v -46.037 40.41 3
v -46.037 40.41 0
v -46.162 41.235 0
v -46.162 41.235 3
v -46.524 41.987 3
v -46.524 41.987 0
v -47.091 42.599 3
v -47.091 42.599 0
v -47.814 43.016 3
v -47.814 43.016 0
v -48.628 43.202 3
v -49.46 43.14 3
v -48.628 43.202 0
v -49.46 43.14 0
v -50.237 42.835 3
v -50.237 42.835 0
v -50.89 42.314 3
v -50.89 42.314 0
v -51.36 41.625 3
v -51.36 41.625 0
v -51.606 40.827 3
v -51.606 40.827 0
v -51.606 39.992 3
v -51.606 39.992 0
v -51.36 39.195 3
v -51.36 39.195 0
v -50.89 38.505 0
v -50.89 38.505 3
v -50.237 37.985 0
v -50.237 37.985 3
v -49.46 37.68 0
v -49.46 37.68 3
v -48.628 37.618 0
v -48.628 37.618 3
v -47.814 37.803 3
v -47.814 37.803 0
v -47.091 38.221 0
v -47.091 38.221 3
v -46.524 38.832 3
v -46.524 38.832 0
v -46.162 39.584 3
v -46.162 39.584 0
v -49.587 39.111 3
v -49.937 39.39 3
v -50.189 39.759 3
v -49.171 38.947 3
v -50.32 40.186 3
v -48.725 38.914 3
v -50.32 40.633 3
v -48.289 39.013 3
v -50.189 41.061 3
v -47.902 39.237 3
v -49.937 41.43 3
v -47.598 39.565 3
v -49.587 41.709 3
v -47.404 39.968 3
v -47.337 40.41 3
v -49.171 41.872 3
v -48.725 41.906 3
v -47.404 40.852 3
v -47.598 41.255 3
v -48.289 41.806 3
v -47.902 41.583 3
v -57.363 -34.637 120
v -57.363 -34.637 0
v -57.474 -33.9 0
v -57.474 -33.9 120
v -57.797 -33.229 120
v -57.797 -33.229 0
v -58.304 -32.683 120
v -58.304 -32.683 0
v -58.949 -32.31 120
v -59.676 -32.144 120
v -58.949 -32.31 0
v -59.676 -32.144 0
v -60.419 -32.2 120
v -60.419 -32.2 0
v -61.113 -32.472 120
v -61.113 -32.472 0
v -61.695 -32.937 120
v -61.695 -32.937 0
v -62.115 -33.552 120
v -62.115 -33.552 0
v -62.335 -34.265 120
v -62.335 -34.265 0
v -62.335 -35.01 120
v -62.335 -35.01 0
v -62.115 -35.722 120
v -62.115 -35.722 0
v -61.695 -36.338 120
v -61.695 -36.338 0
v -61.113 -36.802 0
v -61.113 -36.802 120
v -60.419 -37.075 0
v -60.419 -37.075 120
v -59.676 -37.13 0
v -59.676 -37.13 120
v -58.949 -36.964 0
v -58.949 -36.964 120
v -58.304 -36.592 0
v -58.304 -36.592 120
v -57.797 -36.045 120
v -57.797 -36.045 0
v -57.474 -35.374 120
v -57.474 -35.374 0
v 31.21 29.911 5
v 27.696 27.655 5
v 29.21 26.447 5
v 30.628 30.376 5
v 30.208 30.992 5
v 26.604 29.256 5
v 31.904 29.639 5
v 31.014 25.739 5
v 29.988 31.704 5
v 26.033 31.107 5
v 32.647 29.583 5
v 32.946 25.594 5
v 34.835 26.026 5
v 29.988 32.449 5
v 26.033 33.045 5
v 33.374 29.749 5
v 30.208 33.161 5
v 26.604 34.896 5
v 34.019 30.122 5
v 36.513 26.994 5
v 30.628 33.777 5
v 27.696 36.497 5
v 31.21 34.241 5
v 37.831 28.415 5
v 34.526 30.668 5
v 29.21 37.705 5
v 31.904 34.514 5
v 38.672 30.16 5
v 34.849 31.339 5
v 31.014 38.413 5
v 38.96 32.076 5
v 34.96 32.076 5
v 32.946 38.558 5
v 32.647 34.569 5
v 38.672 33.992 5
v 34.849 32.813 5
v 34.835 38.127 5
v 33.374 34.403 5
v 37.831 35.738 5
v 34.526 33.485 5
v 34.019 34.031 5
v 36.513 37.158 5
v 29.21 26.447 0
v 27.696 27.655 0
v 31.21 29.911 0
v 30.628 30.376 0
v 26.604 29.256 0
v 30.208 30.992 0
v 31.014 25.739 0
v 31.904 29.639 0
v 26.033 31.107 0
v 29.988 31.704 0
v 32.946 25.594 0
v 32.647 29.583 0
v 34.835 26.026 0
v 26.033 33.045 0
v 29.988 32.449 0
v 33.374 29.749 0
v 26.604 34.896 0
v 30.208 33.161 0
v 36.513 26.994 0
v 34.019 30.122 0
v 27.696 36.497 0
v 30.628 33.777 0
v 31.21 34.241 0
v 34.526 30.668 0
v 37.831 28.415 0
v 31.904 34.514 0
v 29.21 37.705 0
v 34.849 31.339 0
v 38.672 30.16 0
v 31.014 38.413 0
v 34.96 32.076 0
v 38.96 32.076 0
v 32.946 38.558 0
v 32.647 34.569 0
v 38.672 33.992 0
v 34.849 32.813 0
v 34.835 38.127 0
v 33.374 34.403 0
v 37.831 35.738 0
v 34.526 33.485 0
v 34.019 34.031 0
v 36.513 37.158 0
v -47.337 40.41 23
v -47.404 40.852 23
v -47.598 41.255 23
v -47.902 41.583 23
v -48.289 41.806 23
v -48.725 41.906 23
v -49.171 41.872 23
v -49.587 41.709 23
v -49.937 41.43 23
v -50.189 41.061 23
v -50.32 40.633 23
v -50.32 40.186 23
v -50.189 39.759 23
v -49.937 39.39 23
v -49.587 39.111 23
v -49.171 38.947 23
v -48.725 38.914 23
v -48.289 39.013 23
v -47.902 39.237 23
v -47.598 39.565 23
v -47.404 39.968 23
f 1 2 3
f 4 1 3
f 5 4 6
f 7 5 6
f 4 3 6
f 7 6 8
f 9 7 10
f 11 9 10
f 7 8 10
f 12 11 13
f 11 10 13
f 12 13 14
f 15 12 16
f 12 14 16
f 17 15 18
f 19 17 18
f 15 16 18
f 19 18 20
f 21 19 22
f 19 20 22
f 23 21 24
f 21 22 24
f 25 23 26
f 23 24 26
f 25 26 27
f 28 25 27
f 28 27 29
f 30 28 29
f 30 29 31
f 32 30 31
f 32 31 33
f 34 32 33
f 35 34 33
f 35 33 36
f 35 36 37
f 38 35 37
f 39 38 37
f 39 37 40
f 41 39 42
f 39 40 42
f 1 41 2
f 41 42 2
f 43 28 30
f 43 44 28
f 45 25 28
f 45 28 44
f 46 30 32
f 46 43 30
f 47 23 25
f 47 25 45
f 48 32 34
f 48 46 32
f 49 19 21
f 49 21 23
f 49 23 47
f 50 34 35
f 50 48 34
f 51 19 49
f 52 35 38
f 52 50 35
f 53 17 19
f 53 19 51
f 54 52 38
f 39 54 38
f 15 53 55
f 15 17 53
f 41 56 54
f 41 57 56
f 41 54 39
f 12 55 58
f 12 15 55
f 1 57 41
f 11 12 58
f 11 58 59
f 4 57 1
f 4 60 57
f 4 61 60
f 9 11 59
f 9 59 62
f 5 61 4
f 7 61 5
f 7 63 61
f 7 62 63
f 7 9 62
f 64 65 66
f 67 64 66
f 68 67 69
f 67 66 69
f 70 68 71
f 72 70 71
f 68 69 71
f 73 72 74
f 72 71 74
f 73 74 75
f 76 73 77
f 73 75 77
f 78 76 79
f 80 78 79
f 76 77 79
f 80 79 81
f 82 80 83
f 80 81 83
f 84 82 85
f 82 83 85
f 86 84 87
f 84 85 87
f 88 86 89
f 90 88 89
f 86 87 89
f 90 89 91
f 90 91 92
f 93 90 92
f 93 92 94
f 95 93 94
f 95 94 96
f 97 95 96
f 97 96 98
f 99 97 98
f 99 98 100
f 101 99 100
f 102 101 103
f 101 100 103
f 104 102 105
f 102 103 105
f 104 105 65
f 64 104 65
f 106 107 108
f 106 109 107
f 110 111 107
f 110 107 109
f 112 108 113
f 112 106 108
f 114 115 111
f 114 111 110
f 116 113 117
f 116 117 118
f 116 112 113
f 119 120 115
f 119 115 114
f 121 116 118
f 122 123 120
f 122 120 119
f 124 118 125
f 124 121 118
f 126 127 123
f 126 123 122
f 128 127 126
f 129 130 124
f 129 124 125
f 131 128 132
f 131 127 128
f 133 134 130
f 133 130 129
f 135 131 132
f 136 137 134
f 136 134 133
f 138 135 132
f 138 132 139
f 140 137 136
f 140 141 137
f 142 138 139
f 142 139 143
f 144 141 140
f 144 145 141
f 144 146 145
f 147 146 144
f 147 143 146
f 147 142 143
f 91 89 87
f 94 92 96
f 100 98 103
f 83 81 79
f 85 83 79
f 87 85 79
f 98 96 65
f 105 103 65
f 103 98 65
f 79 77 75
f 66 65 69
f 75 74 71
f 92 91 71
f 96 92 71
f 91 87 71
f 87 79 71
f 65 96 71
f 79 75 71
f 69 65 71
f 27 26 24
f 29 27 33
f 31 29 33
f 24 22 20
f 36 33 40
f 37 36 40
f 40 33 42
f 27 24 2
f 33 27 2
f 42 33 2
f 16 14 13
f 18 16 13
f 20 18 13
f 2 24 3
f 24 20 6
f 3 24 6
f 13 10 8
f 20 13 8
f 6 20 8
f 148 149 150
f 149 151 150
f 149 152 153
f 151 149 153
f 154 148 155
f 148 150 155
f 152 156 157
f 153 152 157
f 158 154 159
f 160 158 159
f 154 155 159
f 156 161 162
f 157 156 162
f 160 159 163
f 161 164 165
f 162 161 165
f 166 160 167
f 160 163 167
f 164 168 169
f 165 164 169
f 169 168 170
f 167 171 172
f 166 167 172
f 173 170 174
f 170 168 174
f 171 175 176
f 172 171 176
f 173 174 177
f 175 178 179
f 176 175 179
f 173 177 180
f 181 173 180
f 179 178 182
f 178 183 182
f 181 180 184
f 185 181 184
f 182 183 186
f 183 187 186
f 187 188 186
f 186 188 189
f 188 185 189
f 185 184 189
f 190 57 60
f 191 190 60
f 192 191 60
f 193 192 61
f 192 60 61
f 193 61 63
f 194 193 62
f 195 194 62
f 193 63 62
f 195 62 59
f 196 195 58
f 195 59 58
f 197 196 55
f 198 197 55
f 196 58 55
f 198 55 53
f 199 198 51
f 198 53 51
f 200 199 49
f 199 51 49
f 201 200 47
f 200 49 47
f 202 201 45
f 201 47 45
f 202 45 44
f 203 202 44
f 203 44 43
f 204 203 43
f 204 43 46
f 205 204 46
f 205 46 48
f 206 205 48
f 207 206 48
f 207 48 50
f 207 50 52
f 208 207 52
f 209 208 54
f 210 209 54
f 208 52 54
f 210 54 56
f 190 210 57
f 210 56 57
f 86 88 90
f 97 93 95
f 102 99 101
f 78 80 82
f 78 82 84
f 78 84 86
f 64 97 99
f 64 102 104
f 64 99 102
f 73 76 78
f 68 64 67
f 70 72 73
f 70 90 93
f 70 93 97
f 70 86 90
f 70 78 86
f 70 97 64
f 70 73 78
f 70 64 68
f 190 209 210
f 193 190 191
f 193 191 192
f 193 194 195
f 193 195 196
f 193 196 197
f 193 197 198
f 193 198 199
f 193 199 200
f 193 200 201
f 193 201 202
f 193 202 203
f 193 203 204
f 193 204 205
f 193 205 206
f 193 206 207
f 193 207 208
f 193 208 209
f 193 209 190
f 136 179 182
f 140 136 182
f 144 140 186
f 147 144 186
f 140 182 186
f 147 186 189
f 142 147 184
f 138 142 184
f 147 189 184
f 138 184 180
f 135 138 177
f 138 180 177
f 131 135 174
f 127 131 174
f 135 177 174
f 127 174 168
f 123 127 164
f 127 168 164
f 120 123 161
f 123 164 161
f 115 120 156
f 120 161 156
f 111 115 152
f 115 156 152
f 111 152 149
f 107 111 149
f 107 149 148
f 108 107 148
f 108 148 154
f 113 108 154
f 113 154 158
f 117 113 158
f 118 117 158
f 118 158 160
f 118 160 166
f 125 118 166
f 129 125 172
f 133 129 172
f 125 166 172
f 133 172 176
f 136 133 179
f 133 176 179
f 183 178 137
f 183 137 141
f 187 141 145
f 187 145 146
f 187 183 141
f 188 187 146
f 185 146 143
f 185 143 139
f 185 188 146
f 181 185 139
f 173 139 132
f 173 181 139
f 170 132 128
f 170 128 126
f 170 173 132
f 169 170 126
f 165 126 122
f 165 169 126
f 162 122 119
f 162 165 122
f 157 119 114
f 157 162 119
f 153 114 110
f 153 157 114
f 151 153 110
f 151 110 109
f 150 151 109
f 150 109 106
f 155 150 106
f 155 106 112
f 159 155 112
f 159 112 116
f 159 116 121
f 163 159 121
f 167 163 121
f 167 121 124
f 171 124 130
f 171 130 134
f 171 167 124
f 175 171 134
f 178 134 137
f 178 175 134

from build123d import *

# Parameters (mm, degrees)
F0_R     = 2.8
F1_DEPTH = 3
F2_R     = 1.5
F3_DEPTH = 20
F4_R     = 6.5
F4_R_2   = 2.5
F5_DEPTH = 5
F6_R     = 2.5
F7_DEPTH = 120


with BuildPart() as f1:
    # F0 (on Top) → F1 (new body)
    with BuildSketch(Plane.XY):
        with Locations((-48.837181, 40.40977)):
            Circle(F0_R)
    extrude(amount=F1_DEPTH)

    # F2 (on face) → F3 (join)
    with BuildSketch(Plane.XY.offset(3)):
        with Locations((-48.837181, 40.40977)):
            Circle(F2_R)
    extrude(amount=F3_DEPTH)


with BuildPart() as f5:
    # F4 (on Top) → F5 (new body)
    with BuildSketch(Plane.XY):
        with Locations((32.460369, 32.076221)):
            Circle(F4_R)
        with Locations((32.460369, 32.076221)):
            Circle(F4_R_2, mode=Mode.SUBTRACT)
    extrude(amount=F5_DEPTH)


with BuildPart() as f7:
    # F6 (on Top) → F7 (new body)
    with BuildSketch(Plane.XY):
        with Locations((-59.862804, -34.637194)):
            Circle(F6_R)
    extrude(amount=F7_DEPTH)


solid = Compound([f1.part, f5.part, f7.part])
